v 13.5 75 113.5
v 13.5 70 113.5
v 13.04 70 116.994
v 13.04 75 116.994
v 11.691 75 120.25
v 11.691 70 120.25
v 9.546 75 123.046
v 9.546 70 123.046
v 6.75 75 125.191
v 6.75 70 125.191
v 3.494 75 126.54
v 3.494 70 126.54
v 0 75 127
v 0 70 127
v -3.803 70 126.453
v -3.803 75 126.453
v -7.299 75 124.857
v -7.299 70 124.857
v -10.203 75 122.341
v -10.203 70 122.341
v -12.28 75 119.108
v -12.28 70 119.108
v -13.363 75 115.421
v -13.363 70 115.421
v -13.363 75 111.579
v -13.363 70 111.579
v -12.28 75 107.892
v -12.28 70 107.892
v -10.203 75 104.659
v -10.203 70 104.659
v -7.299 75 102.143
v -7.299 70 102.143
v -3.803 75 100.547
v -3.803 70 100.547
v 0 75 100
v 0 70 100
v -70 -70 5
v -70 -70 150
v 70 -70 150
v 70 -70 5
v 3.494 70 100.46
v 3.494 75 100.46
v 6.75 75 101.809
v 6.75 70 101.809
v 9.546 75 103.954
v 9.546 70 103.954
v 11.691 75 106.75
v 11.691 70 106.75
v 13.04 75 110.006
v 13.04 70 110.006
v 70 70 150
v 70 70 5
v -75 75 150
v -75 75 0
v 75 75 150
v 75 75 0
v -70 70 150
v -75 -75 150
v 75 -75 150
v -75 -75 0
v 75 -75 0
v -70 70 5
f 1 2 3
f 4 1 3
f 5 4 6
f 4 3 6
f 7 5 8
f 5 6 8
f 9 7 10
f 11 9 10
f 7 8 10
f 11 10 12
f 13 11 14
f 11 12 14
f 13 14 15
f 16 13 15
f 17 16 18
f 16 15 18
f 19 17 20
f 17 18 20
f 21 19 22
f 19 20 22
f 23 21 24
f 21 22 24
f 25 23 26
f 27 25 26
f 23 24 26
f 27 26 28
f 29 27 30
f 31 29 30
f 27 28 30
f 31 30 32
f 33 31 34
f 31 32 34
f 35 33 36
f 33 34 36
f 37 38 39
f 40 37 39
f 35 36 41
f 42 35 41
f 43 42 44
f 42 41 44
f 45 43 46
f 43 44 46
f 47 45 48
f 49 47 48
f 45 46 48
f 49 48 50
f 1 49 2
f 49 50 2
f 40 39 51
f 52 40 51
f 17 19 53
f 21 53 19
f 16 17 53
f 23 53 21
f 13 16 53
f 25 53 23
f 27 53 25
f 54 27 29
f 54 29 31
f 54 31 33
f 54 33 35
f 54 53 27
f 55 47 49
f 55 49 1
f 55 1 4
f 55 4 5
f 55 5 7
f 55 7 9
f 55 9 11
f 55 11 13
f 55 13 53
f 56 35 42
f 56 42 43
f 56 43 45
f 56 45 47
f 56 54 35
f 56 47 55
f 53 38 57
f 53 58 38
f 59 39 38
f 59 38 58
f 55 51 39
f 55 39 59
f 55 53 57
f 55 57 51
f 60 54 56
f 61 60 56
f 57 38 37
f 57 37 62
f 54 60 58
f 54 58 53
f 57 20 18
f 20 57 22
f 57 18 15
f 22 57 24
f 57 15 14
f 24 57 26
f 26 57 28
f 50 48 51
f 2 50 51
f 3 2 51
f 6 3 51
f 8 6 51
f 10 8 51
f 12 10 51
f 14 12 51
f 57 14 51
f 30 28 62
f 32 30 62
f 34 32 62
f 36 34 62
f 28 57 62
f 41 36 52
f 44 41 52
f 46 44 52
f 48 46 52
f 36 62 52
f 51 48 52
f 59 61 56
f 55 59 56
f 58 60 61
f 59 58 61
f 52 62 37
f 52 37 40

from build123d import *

# Parameters (mm, degrees)
F0_W     = 150
F0_H     = 150
F1_DEPTH = 150
F2_T     = -5
F4_DEPTH = 5


with BuildPart() as f1:
    # F0 (on Top) → F1 (new body)
    with BuildSketch(Plane.XY):
        Rectangle(F0_W, F0_H)
    extrude(amount=F1_DEPTH)

    # F2
    f2_openings = [f1.faces().sort_by_distance(p)[0] for p in [
        (0, 0, 150),
    ]]
    offset(amount=F2_T, openings=f2_openings)

    # F3 (on face) → F4 (cut)
    with BuildSketch(Plane.XZ.offset(-70)):
        with BuildLine():
            ThreePointArc((13.5, 113.5), (9.545942, 123.045942), (0, 127))
            Line((0, 127), (0, 100))
            ThreePointArc((0, 100), (9.545942, 103.954058), (13.5, 113.5))
        make_face()
        with BuildLine():
            Line((0, 100), (0, 127))
            ThreePointArc((0, 127), (-13.5, 113.5), (0, 100))
        make_face()
    extrude(amount=-F4_DEPTH, mode=Mode.SUBTRACT)


solid = f1.part
